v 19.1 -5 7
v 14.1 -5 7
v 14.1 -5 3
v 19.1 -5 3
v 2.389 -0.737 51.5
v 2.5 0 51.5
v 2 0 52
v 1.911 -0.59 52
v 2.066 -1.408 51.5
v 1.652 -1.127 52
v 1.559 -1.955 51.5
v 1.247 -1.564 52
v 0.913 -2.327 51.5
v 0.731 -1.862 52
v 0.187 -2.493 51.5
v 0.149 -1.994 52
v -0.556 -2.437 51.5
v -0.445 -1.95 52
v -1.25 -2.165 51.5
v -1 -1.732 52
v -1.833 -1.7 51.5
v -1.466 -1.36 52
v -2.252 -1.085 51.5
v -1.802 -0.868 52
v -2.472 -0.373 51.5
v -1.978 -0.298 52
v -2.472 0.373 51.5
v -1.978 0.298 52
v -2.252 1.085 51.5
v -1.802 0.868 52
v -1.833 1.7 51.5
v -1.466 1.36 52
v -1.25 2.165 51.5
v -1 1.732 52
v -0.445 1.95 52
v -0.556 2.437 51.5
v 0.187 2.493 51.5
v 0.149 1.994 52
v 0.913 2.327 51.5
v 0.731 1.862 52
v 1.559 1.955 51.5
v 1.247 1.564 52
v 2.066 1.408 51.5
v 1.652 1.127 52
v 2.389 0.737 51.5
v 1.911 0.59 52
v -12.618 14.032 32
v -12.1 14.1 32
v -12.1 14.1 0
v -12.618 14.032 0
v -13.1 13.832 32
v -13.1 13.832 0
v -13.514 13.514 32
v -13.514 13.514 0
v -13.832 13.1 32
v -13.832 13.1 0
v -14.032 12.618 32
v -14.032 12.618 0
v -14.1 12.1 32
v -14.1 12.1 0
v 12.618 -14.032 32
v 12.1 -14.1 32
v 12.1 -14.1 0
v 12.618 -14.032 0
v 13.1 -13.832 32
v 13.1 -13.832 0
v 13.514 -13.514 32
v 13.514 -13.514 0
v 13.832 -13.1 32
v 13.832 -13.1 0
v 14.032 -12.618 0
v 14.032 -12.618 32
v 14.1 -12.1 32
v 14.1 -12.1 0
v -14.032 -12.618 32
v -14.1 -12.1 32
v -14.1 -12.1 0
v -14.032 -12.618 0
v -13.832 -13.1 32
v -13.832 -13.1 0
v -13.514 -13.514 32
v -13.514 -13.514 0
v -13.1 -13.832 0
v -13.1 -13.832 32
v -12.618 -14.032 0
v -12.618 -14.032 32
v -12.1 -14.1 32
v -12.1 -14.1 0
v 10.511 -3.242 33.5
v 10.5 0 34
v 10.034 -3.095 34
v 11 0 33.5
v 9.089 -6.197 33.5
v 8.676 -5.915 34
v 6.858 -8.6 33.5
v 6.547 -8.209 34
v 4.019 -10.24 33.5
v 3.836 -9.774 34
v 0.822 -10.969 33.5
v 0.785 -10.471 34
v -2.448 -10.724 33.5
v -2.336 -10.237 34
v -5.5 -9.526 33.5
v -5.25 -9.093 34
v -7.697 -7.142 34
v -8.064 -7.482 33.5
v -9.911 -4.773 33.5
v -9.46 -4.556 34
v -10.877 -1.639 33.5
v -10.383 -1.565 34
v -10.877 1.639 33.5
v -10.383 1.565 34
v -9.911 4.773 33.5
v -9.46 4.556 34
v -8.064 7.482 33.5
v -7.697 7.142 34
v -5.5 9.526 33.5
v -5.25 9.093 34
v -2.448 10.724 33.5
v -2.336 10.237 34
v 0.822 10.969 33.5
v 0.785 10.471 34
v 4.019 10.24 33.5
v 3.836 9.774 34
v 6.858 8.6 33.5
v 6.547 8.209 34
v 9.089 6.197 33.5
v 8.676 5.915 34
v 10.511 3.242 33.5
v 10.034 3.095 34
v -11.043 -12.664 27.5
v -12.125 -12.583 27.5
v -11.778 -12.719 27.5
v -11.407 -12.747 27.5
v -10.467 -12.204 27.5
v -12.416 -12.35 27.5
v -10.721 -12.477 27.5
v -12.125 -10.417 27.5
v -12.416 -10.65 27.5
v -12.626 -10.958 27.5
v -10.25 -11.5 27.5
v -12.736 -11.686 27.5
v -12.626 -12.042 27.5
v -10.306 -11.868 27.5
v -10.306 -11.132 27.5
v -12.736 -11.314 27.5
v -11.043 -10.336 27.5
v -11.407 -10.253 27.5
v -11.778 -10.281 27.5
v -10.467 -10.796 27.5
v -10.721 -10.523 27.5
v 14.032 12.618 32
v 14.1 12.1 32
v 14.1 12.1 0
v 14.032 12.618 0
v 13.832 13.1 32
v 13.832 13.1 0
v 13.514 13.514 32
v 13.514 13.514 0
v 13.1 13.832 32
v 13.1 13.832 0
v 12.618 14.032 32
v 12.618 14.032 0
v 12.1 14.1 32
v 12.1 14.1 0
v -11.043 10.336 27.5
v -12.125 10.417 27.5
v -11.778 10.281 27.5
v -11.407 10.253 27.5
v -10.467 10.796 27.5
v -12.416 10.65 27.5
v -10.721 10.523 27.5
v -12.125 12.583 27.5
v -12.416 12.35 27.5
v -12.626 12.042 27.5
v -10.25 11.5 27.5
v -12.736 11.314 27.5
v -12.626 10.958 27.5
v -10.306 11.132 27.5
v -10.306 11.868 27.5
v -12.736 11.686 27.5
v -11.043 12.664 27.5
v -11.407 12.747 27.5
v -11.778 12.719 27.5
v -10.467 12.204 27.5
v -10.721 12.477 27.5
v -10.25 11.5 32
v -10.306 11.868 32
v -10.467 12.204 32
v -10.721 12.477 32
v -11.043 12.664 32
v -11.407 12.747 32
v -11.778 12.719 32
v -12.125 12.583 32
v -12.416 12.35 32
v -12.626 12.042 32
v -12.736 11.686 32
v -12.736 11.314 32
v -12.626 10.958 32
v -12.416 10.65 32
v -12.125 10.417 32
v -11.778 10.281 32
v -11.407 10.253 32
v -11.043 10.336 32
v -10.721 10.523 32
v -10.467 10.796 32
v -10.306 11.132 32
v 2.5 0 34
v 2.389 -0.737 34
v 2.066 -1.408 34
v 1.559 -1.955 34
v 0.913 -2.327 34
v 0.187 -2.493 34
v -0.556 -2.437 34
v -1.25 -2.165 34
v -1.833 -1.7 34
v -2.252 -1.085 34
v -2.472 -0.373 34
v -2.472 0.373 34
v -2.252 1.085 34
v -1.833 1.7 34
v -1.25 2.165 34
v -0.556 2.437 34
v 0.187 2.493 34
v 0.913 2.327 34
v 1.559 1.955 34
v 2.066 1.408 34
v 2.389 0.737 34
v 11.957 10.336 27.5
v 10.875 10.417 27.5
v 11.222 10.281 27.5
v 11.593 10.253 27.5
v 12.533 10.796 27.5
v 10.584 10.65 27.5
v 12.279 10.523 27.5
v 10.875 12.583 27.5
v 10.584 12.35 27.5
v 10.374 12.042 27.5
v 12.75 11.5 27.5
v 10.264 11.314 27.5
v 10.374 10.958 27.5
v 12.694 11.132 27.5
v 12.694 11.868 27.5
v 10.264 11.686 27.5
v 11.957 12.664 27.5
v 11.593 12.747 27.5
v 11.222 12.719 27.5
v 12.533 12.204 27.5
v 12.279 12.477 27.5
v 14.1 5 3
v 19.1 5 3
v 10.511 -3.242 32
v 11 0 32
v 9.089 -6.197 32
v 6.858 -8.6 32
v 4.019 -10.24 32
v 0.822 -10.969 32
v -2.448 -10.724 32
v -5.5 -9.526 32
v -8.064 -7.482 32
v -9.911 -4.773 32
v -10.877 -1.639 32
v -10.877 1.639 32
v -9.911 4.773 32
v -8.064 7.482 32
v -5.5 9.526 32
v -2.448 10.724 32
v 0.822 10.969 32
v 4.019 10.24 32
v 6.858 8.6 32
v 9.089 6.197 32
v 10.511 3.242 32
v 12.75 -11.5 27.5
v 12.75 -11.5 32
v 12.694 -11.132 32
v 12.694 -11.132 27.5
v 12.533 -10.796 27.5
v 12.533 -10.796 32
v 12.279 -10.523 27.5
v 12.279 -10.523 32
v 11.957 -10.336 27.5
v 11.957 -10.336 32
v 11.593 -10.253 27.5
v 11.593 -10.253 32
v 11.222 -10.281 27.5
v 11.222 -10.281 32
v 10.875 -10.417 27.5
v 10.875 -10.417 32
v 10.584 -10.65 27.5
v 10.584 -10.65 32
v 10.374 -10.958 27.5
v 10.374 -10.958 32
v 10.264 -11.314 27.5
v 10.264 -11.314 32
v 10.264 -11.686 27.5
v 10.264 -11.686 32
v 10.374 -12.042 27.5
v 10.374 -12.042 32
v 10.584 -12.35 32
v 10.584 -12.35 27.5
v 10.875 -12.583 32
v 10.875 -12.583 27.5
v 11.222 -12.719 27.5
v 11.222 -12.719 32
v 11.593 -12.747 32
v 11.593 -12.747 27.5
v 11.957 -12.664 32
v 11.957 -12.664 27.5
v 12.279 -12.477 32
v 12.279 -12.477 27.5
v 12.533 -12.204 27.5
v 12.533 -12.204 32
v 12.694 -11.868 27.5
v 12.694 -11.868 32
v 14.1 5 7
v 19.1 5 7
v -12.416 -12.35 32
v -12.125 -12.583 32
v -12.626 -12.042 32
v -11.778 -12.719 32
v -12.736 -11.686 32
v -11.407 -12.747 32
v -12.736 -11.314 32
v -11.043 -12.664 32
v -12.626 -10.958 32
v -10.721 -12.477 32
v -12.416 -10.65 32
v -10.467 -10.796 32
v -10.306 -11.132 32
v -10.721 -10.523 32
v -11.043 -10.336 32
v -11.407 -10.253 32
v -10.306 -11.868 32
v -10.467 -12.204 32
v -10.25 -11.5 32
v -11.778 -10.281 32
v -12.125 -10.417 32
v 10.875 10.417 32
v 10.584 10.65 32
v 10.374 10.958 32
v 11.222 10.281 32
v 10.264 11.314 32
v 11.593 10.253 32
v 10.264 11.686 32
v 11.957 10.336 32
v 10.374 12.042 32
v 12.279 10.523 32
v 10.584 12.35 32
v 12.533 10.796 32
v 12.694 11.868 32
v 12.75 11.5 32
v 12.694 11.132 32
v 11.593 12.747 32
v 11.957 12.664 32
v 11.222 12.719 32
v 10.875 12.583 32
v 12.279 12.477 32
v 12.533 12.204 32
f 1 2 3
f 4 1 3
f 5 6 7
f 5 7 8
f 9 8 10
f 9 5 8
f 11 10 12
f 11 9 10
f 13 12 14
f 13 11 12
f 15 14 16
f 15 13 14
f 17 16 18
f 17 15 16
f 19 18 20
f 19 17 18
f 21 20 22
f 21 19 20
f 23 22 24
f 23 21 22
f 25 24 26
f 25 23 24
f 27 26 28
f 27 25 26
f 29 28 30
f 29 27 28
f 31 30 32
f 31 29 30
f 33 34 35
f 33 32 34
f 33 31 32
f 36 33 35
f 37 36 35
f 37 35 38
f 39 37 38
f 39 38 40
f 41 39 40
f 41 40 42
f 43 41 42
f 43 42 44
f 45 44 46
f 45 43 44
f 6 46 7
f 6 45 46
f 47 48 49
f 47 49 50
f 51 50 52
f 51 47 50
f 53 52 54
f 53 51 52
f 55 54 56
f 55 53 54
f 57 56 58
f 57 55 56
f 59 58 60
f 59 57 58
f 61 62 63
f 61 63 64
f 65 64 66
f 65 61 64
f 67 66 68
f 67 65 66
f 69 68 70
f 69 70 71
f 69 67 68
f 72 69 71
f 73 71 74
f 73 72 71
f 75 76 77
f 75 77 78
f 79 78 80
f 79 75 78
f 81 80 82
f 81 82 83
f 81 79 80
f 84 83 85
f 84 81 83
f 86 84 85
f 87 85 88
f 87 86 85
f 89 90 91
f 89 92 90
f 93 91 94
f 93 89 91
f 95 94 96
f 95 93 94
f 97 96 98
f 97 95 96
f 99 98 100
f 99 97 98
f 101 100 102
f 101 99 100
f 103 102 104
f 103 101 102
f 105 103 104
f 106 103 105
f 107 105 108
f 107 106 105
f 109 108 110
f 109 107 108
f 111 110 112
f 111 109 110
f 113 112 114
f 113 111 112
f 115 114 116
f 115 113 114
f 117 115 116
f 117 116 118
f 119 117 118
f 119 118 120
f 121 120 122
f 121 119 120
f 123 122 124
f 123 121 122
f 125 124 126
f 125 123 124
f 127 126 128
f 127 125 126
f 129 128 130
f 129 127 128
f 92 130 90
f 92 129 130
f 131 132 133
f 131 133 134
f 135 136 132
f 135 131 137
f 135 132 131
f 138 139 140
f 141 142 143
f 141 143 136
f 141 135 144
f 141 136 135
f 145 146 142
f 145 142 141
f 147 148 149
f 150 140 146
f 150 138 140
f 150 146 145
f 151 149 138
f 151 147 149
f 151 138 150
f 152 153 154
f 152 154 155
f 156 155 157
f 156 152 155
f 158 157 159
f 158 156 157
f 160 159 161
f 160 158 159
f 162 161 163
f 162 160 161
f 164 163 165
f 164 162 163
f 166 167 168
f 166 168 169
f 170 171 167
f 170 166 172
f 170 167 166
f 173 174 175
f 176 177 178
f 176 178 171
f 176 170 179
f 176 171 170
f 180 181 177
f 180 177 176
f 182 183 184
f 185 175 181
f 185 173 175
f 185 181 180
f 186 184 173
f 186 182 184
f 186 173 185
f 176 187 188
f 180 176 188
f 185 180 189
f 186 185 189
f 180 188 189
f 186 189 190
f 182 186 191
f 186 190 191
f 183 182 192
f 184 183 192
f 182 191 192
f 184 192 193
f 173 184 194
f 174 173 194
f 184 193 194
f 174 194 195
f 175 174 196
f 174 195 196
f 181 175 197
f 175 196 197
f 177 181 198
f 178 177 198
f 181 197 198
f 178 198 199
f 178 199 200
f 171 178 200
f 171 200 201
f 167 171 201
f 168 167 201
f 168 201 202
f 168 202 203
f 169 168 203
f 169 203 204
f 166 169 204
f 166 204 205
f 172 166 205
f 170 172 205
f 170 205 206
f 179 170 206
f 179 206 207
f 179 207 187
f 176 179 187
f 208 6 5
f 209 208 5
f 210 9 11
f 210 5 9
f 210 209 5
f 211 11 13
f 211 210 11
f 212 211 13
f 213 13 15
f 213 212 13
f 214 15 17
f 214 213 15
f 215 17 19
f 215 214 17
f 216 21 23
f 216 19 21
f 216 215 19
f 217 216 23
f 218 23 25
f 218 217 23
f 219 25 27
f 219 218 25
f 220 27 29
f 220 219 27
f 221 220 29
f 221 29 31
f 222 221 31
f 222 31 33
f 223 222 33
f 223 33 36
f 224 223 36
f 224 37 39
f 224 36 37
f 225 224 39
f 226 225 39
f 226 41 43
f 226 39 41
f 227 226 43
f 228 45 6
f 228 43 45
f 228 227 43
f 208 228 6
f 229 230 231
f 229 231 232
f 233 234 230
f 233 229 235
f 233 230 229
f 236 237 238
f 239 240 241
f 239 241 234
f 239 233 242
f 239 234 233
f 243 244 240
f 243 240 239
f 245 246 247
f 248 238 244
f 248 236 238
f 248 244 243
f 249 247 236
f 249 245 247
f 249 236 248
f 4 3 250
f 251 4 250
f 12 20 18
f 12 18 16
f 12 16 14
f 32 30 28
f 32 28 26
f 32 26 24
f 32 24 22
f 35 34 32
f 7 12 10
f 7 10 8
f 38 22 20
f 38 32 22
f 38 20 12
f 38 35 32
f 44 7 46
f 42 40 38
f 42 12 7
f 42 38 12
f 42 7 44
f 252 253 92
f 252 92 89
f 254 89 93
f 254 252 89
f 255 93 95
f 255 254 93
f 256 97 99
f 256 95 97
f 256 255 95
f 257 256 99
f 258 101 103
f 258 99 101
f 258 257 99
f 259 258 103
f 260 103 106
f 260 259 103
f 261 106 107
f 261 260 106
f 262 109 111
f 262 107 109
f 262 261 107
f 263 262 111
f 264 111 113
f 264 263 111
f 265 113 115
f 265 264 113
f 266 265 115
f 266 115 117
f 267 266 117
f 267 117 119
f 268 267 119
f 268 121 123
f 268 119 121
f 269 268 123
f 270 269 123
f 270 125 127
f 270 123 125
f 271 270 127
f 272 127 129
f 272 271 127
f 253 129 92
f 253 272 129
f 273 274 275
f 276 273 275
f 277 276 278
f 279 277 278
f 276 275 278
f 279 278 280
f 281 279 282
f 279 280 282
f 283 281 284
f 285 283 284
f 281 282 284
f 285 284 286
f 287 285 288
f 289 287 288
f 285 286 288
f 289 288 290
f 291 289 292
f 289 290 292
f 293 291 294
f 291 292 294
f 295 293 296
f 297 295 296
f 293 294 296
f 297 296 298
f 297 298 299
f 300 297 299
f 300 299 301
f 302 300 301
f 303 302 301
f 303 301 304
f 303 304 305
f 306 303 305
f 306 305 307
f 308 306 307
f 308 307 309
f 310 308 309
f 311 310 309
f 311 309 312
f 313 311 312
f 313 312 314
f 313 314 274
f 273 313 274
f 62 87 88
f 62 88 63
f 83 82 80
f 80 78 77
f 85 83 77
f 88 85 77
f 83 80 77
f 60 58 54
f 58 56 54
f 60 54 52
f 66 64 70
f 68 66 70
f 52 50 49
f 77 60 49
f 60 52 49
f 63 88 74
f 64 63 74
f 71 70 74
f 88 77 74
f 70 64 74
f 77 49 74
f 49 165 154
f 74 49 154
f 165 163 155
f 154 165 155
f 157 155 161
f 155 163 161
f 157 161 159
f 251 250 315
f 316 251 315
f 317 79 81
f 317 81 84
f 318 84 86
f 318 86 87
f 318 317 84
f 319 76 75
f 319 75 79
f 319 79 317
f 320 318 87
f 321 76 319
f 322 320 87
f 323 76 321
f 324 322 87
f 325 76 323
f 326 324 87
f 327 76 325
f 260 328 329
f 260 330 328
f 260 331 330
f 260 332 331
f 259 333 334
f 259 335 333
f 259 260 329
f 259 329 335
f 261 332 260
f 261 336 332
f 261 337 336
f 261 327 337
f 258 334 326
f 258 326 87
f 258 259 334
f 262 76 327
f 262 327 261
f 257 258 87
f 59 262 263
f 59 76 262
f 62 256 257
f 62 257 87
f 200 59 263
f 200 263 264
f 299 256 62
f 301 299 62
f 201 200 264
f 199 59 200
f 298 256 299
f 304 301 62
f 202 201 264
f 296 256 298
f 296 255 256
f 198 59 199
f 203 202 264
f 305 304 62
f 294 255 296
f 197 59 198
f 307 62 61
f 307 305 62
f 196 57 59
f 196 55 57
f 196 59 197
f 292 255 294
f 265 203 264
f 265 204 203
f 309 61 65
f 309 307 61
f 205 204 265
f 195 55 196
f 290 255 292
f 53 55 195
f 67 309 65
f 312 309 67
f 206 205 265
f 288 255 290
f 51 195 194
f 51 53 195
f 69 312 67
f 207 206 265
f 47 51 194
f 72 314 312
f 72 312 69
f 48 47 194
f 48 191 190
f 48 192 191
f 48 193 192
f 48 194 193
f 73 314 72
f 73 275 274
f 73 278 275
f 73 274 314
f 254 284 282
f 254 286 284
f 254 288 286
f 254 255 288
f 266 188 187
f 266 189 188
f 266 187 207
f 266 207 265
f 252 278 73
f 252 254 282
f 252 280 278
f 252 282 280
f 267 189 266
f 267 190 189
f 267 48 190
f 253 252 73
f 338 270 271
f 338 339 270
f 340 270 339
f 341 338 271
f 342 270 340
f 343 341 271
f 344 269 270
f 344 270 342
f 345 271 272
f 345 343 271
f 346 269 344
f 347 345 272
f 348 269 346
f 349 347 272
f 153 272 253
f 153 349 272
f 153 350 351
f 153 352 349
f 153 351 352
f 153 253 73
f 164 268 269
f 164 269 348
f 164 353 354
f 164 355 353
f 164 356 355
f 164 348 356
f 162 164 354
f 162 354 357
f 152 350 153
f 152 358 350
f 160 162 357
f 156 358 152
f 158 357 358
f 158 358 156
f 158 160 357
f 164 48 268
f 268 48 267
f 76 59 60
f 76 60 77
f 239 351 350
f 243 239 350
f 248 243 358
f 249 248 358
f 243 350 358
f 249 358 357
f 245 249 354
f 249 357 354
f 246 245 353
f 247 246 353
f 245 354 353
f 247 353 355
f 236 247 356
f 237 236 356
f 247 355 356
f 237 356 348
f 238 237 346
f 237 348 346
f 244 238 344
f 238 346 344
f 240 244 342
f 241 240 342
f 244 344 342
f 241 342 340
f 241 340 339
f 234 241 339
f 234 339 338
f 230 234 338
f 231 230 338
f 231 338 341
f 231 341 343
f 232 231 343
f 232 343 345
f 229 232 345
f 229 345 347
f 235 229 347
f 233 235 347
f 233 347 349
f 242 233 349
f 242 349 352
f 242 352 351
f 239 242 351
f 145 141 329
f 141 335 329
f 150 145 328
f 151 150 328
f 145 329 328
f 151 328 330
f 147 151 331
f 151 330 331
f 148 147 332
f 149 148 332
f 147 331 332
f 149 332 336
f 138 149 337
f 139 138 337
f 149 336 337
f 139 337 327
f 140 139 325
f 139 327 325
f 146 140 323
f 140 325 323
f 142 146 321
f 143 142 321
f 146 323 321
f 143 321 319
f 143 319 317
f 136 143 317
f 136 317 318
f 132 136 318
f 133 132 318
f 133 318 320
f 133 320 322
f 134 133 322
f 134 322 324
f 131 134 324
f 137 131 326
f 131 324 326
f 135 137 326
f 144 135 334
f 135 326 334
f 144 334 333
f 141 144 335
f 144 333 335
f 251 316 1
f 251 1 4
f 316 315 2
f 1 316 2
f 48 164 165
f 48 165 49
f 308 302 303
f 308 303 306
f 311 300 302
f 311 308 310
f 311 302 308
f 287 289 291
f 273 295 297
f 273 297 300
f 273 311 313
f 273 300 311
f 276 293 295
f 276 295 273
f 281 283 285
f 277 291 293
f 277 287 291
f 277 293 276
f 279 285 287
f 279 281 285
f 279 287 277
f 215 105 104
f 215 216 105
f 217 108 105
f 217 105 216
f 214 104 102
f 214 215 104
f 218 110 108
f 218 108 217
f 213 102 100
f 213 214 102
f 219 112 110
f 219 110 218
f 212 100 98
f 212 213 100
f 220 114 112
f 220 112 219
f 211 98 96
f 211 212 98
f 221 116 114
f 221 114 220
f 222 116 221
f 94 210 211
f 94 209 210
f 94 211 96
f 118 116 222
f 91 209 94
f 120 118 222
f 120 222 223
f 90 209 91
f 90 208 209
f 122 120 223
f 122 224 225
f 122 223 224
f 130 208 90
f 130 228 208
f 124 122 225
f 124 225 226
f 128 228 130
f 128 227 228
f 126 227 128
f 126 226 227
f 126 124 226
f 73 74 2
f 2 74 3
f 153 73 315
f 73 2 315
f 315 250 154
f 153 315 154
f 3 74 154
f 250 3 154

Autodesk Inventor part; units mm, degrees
ref_plane "YZ Plane" through (0, 0, 0) normal (1, 0, 0) x (0, 1, 0)
ref_plane "XZ Plane" through (0, 0, 0) normal (0, 1, 0) x (-1, 0, 0)
ref_plane "XY Plane" through (0, 0, 0) normal (0, 0, 1) x (1, 0, 0)
sketch "Sketch1" plane through (0, 0, 0) normal (0, 0, 1) x (1, 0, 0)
  line L0 (-14.1, -14.1) -> (14.1, -14.1)
  line L1 (14.1, -14.1) -> (14.1, 14.1)
  line L2 (14.1, 14.1) -> (-14.1, 14.1)
  line L3 (-14.1, 14.1) -> (-14.1, -14.1)
  line L4 (-14.1, -14.1) -> (14.1, 14.1) construction
  line L5 (14.1, -14.1) -> (-14.1, 14.1) construction
  point P0 (0, 0)
  dimension "d0" = 28.2
  dimension "d1" = 28.2
extrude "Extrusion1" add sketch "Sketch1" along normal blind 32
sketch "Sketch2" plane through (0, 0, 32) normal (0, 0, 1) x (1, 0, 0)
  line L0 (-11.5, -11.5) -> (11.5, -11.5) construction
  line L1 (11.5, -11.5) -> (11.5, 11.5) construction
  line L2 (11.5, 11.5) -> (-11.5, 11.5) construction
  line L3 (-11.5, 11.5) -> (-11.5, -11.5) construction
  line L4 (-11.5, -11.5) -> (11.5, 11.5) construction
  line L5 (11.5, -11.5) -> (-11.5, 11.5) construction
  circle A0 centre (-11.5, 11.5) radius 1.25
  line L6 (11.5, -11.5) -> (11.5, 11.5) construction
  line L7 (11.5, 11.5) -> (-11.5, 11.5) construction
  line L8 (-11.5, 11.5) -> (-11.5, -11.5) construction
  line L9 (-11.5, -11.5) -> (11.5, -11.5) construction
  line L10 (11.5, -11.5) -> (-11.5, 11.5) construction
  line L11 (11.5, 11.5) -> (-11.5, -11.5) construction
  circle A1 centre (-11.5, -11.5) radius 1.25
  line L12 (11.5, 11.5) -> (-11.5, 11.5) construction
  line L13 (-11.5, 11.5) -> (-11.5, -11.5) construction
  line L14 (-11.5, -11.5) -> (11.5, -11.5) construction
  line L15 (11.5, -11.5) -> (11.5, 11.5) construction
  line L16 (11.5, 11.5) -> (-11.5, -11.5) construction
  line L17 (-11.5, 11.5) -> (11.5, -11.5) construction
  circle A2 centre (11.5, -11.5) radius 1.25
  line L18 (-11.5, 11.5) -> (-11.5, -11.5) construction
  line L19 (-11.5, -11.5) -> (11.5, -11.5) construction
  line L20 (11.5, -11.5) -> (11.5, 11.5) construction
  line L21 (11.5, 11.5) -> (-11.5, 11.5) construction
  line L22 (-11.5, 11.5) -> (11.5, -11.5) construction
  line L23 (-11.5, -11.5) -> (11.5, 11.5) construction
  circle A3 centre (11.5, 11.5) radius 1.25
  point P0 (0, 0)
  point P1 (0, 0)
  point P2 (0, 0)
  point P3 (0, 0)
  dimension "d4" = 23
  dimension "d5" = 23
  dimension "d6" = 2.5
  dimension "d9" = 360
extrude "Extrusion2" cut sketch "Sketch2" against normal blind 4.5
sketch "Sketch3" plane through (0, 0, 32) normal (0, 0, 1) x (1, 0, 0)
  circle A0 centre (0, 0) radius 11
  dimension "d13" = 22
extrude "Extrusion3" add sketch "Sketch3" along normal blind 2
sketch "Sketch4" plane through (0, 0, 34) normal (0, 0, 1) x (1, 0, 0)
  circle A0 centre (0, 0) radius 2.5
  dimension "d16" = 5
extrude "Extrusion4" add sketch "Sketch4" along normal blind 18
fillet "Fillet1" radius 2 4 edges at (-14.1, 14.1, 16) (14.1, 14.1, 16) (14.1, -14.1, 16) (-14.1, -14.1, 16)
chamfer "Chamfer1" distance 0.5 angle 45 1 edges at (-2.5, 0, 52)
chamfer "Chamfer2" distance 0.5 angle 45 1 edges at (-11, 0, 34)
sketch "Sketch5" plane through (14.1, -12.1, 0) normal (1, 0, 0) x (0, 0, -1)
  line L0 (0, 12.1) -> (-5, 12.1) construction
  line L1 (-7, 7.1) -> (-3, 7.1)
  line L2 (-3, 7.1) -> (-3, 17.1)
  line L3 (-3, 17.1) -> (-7, 17.1)
  line L4 (-7, 17.1) -> (-7, 7.1)
  line L5 (-7, 7.1) -> (-3, 17.1) construction
  line L6 (-3, 7.1) -> (-7, 17.1) construction
  dimension "d26" = 5
  dimension "d27" = 4
  dimension "d28" = 10
extrude "Extrusion5" add sketch "Sketch5" along normal blind 5
properties part number "nema11_SY28STH32-0674A"
